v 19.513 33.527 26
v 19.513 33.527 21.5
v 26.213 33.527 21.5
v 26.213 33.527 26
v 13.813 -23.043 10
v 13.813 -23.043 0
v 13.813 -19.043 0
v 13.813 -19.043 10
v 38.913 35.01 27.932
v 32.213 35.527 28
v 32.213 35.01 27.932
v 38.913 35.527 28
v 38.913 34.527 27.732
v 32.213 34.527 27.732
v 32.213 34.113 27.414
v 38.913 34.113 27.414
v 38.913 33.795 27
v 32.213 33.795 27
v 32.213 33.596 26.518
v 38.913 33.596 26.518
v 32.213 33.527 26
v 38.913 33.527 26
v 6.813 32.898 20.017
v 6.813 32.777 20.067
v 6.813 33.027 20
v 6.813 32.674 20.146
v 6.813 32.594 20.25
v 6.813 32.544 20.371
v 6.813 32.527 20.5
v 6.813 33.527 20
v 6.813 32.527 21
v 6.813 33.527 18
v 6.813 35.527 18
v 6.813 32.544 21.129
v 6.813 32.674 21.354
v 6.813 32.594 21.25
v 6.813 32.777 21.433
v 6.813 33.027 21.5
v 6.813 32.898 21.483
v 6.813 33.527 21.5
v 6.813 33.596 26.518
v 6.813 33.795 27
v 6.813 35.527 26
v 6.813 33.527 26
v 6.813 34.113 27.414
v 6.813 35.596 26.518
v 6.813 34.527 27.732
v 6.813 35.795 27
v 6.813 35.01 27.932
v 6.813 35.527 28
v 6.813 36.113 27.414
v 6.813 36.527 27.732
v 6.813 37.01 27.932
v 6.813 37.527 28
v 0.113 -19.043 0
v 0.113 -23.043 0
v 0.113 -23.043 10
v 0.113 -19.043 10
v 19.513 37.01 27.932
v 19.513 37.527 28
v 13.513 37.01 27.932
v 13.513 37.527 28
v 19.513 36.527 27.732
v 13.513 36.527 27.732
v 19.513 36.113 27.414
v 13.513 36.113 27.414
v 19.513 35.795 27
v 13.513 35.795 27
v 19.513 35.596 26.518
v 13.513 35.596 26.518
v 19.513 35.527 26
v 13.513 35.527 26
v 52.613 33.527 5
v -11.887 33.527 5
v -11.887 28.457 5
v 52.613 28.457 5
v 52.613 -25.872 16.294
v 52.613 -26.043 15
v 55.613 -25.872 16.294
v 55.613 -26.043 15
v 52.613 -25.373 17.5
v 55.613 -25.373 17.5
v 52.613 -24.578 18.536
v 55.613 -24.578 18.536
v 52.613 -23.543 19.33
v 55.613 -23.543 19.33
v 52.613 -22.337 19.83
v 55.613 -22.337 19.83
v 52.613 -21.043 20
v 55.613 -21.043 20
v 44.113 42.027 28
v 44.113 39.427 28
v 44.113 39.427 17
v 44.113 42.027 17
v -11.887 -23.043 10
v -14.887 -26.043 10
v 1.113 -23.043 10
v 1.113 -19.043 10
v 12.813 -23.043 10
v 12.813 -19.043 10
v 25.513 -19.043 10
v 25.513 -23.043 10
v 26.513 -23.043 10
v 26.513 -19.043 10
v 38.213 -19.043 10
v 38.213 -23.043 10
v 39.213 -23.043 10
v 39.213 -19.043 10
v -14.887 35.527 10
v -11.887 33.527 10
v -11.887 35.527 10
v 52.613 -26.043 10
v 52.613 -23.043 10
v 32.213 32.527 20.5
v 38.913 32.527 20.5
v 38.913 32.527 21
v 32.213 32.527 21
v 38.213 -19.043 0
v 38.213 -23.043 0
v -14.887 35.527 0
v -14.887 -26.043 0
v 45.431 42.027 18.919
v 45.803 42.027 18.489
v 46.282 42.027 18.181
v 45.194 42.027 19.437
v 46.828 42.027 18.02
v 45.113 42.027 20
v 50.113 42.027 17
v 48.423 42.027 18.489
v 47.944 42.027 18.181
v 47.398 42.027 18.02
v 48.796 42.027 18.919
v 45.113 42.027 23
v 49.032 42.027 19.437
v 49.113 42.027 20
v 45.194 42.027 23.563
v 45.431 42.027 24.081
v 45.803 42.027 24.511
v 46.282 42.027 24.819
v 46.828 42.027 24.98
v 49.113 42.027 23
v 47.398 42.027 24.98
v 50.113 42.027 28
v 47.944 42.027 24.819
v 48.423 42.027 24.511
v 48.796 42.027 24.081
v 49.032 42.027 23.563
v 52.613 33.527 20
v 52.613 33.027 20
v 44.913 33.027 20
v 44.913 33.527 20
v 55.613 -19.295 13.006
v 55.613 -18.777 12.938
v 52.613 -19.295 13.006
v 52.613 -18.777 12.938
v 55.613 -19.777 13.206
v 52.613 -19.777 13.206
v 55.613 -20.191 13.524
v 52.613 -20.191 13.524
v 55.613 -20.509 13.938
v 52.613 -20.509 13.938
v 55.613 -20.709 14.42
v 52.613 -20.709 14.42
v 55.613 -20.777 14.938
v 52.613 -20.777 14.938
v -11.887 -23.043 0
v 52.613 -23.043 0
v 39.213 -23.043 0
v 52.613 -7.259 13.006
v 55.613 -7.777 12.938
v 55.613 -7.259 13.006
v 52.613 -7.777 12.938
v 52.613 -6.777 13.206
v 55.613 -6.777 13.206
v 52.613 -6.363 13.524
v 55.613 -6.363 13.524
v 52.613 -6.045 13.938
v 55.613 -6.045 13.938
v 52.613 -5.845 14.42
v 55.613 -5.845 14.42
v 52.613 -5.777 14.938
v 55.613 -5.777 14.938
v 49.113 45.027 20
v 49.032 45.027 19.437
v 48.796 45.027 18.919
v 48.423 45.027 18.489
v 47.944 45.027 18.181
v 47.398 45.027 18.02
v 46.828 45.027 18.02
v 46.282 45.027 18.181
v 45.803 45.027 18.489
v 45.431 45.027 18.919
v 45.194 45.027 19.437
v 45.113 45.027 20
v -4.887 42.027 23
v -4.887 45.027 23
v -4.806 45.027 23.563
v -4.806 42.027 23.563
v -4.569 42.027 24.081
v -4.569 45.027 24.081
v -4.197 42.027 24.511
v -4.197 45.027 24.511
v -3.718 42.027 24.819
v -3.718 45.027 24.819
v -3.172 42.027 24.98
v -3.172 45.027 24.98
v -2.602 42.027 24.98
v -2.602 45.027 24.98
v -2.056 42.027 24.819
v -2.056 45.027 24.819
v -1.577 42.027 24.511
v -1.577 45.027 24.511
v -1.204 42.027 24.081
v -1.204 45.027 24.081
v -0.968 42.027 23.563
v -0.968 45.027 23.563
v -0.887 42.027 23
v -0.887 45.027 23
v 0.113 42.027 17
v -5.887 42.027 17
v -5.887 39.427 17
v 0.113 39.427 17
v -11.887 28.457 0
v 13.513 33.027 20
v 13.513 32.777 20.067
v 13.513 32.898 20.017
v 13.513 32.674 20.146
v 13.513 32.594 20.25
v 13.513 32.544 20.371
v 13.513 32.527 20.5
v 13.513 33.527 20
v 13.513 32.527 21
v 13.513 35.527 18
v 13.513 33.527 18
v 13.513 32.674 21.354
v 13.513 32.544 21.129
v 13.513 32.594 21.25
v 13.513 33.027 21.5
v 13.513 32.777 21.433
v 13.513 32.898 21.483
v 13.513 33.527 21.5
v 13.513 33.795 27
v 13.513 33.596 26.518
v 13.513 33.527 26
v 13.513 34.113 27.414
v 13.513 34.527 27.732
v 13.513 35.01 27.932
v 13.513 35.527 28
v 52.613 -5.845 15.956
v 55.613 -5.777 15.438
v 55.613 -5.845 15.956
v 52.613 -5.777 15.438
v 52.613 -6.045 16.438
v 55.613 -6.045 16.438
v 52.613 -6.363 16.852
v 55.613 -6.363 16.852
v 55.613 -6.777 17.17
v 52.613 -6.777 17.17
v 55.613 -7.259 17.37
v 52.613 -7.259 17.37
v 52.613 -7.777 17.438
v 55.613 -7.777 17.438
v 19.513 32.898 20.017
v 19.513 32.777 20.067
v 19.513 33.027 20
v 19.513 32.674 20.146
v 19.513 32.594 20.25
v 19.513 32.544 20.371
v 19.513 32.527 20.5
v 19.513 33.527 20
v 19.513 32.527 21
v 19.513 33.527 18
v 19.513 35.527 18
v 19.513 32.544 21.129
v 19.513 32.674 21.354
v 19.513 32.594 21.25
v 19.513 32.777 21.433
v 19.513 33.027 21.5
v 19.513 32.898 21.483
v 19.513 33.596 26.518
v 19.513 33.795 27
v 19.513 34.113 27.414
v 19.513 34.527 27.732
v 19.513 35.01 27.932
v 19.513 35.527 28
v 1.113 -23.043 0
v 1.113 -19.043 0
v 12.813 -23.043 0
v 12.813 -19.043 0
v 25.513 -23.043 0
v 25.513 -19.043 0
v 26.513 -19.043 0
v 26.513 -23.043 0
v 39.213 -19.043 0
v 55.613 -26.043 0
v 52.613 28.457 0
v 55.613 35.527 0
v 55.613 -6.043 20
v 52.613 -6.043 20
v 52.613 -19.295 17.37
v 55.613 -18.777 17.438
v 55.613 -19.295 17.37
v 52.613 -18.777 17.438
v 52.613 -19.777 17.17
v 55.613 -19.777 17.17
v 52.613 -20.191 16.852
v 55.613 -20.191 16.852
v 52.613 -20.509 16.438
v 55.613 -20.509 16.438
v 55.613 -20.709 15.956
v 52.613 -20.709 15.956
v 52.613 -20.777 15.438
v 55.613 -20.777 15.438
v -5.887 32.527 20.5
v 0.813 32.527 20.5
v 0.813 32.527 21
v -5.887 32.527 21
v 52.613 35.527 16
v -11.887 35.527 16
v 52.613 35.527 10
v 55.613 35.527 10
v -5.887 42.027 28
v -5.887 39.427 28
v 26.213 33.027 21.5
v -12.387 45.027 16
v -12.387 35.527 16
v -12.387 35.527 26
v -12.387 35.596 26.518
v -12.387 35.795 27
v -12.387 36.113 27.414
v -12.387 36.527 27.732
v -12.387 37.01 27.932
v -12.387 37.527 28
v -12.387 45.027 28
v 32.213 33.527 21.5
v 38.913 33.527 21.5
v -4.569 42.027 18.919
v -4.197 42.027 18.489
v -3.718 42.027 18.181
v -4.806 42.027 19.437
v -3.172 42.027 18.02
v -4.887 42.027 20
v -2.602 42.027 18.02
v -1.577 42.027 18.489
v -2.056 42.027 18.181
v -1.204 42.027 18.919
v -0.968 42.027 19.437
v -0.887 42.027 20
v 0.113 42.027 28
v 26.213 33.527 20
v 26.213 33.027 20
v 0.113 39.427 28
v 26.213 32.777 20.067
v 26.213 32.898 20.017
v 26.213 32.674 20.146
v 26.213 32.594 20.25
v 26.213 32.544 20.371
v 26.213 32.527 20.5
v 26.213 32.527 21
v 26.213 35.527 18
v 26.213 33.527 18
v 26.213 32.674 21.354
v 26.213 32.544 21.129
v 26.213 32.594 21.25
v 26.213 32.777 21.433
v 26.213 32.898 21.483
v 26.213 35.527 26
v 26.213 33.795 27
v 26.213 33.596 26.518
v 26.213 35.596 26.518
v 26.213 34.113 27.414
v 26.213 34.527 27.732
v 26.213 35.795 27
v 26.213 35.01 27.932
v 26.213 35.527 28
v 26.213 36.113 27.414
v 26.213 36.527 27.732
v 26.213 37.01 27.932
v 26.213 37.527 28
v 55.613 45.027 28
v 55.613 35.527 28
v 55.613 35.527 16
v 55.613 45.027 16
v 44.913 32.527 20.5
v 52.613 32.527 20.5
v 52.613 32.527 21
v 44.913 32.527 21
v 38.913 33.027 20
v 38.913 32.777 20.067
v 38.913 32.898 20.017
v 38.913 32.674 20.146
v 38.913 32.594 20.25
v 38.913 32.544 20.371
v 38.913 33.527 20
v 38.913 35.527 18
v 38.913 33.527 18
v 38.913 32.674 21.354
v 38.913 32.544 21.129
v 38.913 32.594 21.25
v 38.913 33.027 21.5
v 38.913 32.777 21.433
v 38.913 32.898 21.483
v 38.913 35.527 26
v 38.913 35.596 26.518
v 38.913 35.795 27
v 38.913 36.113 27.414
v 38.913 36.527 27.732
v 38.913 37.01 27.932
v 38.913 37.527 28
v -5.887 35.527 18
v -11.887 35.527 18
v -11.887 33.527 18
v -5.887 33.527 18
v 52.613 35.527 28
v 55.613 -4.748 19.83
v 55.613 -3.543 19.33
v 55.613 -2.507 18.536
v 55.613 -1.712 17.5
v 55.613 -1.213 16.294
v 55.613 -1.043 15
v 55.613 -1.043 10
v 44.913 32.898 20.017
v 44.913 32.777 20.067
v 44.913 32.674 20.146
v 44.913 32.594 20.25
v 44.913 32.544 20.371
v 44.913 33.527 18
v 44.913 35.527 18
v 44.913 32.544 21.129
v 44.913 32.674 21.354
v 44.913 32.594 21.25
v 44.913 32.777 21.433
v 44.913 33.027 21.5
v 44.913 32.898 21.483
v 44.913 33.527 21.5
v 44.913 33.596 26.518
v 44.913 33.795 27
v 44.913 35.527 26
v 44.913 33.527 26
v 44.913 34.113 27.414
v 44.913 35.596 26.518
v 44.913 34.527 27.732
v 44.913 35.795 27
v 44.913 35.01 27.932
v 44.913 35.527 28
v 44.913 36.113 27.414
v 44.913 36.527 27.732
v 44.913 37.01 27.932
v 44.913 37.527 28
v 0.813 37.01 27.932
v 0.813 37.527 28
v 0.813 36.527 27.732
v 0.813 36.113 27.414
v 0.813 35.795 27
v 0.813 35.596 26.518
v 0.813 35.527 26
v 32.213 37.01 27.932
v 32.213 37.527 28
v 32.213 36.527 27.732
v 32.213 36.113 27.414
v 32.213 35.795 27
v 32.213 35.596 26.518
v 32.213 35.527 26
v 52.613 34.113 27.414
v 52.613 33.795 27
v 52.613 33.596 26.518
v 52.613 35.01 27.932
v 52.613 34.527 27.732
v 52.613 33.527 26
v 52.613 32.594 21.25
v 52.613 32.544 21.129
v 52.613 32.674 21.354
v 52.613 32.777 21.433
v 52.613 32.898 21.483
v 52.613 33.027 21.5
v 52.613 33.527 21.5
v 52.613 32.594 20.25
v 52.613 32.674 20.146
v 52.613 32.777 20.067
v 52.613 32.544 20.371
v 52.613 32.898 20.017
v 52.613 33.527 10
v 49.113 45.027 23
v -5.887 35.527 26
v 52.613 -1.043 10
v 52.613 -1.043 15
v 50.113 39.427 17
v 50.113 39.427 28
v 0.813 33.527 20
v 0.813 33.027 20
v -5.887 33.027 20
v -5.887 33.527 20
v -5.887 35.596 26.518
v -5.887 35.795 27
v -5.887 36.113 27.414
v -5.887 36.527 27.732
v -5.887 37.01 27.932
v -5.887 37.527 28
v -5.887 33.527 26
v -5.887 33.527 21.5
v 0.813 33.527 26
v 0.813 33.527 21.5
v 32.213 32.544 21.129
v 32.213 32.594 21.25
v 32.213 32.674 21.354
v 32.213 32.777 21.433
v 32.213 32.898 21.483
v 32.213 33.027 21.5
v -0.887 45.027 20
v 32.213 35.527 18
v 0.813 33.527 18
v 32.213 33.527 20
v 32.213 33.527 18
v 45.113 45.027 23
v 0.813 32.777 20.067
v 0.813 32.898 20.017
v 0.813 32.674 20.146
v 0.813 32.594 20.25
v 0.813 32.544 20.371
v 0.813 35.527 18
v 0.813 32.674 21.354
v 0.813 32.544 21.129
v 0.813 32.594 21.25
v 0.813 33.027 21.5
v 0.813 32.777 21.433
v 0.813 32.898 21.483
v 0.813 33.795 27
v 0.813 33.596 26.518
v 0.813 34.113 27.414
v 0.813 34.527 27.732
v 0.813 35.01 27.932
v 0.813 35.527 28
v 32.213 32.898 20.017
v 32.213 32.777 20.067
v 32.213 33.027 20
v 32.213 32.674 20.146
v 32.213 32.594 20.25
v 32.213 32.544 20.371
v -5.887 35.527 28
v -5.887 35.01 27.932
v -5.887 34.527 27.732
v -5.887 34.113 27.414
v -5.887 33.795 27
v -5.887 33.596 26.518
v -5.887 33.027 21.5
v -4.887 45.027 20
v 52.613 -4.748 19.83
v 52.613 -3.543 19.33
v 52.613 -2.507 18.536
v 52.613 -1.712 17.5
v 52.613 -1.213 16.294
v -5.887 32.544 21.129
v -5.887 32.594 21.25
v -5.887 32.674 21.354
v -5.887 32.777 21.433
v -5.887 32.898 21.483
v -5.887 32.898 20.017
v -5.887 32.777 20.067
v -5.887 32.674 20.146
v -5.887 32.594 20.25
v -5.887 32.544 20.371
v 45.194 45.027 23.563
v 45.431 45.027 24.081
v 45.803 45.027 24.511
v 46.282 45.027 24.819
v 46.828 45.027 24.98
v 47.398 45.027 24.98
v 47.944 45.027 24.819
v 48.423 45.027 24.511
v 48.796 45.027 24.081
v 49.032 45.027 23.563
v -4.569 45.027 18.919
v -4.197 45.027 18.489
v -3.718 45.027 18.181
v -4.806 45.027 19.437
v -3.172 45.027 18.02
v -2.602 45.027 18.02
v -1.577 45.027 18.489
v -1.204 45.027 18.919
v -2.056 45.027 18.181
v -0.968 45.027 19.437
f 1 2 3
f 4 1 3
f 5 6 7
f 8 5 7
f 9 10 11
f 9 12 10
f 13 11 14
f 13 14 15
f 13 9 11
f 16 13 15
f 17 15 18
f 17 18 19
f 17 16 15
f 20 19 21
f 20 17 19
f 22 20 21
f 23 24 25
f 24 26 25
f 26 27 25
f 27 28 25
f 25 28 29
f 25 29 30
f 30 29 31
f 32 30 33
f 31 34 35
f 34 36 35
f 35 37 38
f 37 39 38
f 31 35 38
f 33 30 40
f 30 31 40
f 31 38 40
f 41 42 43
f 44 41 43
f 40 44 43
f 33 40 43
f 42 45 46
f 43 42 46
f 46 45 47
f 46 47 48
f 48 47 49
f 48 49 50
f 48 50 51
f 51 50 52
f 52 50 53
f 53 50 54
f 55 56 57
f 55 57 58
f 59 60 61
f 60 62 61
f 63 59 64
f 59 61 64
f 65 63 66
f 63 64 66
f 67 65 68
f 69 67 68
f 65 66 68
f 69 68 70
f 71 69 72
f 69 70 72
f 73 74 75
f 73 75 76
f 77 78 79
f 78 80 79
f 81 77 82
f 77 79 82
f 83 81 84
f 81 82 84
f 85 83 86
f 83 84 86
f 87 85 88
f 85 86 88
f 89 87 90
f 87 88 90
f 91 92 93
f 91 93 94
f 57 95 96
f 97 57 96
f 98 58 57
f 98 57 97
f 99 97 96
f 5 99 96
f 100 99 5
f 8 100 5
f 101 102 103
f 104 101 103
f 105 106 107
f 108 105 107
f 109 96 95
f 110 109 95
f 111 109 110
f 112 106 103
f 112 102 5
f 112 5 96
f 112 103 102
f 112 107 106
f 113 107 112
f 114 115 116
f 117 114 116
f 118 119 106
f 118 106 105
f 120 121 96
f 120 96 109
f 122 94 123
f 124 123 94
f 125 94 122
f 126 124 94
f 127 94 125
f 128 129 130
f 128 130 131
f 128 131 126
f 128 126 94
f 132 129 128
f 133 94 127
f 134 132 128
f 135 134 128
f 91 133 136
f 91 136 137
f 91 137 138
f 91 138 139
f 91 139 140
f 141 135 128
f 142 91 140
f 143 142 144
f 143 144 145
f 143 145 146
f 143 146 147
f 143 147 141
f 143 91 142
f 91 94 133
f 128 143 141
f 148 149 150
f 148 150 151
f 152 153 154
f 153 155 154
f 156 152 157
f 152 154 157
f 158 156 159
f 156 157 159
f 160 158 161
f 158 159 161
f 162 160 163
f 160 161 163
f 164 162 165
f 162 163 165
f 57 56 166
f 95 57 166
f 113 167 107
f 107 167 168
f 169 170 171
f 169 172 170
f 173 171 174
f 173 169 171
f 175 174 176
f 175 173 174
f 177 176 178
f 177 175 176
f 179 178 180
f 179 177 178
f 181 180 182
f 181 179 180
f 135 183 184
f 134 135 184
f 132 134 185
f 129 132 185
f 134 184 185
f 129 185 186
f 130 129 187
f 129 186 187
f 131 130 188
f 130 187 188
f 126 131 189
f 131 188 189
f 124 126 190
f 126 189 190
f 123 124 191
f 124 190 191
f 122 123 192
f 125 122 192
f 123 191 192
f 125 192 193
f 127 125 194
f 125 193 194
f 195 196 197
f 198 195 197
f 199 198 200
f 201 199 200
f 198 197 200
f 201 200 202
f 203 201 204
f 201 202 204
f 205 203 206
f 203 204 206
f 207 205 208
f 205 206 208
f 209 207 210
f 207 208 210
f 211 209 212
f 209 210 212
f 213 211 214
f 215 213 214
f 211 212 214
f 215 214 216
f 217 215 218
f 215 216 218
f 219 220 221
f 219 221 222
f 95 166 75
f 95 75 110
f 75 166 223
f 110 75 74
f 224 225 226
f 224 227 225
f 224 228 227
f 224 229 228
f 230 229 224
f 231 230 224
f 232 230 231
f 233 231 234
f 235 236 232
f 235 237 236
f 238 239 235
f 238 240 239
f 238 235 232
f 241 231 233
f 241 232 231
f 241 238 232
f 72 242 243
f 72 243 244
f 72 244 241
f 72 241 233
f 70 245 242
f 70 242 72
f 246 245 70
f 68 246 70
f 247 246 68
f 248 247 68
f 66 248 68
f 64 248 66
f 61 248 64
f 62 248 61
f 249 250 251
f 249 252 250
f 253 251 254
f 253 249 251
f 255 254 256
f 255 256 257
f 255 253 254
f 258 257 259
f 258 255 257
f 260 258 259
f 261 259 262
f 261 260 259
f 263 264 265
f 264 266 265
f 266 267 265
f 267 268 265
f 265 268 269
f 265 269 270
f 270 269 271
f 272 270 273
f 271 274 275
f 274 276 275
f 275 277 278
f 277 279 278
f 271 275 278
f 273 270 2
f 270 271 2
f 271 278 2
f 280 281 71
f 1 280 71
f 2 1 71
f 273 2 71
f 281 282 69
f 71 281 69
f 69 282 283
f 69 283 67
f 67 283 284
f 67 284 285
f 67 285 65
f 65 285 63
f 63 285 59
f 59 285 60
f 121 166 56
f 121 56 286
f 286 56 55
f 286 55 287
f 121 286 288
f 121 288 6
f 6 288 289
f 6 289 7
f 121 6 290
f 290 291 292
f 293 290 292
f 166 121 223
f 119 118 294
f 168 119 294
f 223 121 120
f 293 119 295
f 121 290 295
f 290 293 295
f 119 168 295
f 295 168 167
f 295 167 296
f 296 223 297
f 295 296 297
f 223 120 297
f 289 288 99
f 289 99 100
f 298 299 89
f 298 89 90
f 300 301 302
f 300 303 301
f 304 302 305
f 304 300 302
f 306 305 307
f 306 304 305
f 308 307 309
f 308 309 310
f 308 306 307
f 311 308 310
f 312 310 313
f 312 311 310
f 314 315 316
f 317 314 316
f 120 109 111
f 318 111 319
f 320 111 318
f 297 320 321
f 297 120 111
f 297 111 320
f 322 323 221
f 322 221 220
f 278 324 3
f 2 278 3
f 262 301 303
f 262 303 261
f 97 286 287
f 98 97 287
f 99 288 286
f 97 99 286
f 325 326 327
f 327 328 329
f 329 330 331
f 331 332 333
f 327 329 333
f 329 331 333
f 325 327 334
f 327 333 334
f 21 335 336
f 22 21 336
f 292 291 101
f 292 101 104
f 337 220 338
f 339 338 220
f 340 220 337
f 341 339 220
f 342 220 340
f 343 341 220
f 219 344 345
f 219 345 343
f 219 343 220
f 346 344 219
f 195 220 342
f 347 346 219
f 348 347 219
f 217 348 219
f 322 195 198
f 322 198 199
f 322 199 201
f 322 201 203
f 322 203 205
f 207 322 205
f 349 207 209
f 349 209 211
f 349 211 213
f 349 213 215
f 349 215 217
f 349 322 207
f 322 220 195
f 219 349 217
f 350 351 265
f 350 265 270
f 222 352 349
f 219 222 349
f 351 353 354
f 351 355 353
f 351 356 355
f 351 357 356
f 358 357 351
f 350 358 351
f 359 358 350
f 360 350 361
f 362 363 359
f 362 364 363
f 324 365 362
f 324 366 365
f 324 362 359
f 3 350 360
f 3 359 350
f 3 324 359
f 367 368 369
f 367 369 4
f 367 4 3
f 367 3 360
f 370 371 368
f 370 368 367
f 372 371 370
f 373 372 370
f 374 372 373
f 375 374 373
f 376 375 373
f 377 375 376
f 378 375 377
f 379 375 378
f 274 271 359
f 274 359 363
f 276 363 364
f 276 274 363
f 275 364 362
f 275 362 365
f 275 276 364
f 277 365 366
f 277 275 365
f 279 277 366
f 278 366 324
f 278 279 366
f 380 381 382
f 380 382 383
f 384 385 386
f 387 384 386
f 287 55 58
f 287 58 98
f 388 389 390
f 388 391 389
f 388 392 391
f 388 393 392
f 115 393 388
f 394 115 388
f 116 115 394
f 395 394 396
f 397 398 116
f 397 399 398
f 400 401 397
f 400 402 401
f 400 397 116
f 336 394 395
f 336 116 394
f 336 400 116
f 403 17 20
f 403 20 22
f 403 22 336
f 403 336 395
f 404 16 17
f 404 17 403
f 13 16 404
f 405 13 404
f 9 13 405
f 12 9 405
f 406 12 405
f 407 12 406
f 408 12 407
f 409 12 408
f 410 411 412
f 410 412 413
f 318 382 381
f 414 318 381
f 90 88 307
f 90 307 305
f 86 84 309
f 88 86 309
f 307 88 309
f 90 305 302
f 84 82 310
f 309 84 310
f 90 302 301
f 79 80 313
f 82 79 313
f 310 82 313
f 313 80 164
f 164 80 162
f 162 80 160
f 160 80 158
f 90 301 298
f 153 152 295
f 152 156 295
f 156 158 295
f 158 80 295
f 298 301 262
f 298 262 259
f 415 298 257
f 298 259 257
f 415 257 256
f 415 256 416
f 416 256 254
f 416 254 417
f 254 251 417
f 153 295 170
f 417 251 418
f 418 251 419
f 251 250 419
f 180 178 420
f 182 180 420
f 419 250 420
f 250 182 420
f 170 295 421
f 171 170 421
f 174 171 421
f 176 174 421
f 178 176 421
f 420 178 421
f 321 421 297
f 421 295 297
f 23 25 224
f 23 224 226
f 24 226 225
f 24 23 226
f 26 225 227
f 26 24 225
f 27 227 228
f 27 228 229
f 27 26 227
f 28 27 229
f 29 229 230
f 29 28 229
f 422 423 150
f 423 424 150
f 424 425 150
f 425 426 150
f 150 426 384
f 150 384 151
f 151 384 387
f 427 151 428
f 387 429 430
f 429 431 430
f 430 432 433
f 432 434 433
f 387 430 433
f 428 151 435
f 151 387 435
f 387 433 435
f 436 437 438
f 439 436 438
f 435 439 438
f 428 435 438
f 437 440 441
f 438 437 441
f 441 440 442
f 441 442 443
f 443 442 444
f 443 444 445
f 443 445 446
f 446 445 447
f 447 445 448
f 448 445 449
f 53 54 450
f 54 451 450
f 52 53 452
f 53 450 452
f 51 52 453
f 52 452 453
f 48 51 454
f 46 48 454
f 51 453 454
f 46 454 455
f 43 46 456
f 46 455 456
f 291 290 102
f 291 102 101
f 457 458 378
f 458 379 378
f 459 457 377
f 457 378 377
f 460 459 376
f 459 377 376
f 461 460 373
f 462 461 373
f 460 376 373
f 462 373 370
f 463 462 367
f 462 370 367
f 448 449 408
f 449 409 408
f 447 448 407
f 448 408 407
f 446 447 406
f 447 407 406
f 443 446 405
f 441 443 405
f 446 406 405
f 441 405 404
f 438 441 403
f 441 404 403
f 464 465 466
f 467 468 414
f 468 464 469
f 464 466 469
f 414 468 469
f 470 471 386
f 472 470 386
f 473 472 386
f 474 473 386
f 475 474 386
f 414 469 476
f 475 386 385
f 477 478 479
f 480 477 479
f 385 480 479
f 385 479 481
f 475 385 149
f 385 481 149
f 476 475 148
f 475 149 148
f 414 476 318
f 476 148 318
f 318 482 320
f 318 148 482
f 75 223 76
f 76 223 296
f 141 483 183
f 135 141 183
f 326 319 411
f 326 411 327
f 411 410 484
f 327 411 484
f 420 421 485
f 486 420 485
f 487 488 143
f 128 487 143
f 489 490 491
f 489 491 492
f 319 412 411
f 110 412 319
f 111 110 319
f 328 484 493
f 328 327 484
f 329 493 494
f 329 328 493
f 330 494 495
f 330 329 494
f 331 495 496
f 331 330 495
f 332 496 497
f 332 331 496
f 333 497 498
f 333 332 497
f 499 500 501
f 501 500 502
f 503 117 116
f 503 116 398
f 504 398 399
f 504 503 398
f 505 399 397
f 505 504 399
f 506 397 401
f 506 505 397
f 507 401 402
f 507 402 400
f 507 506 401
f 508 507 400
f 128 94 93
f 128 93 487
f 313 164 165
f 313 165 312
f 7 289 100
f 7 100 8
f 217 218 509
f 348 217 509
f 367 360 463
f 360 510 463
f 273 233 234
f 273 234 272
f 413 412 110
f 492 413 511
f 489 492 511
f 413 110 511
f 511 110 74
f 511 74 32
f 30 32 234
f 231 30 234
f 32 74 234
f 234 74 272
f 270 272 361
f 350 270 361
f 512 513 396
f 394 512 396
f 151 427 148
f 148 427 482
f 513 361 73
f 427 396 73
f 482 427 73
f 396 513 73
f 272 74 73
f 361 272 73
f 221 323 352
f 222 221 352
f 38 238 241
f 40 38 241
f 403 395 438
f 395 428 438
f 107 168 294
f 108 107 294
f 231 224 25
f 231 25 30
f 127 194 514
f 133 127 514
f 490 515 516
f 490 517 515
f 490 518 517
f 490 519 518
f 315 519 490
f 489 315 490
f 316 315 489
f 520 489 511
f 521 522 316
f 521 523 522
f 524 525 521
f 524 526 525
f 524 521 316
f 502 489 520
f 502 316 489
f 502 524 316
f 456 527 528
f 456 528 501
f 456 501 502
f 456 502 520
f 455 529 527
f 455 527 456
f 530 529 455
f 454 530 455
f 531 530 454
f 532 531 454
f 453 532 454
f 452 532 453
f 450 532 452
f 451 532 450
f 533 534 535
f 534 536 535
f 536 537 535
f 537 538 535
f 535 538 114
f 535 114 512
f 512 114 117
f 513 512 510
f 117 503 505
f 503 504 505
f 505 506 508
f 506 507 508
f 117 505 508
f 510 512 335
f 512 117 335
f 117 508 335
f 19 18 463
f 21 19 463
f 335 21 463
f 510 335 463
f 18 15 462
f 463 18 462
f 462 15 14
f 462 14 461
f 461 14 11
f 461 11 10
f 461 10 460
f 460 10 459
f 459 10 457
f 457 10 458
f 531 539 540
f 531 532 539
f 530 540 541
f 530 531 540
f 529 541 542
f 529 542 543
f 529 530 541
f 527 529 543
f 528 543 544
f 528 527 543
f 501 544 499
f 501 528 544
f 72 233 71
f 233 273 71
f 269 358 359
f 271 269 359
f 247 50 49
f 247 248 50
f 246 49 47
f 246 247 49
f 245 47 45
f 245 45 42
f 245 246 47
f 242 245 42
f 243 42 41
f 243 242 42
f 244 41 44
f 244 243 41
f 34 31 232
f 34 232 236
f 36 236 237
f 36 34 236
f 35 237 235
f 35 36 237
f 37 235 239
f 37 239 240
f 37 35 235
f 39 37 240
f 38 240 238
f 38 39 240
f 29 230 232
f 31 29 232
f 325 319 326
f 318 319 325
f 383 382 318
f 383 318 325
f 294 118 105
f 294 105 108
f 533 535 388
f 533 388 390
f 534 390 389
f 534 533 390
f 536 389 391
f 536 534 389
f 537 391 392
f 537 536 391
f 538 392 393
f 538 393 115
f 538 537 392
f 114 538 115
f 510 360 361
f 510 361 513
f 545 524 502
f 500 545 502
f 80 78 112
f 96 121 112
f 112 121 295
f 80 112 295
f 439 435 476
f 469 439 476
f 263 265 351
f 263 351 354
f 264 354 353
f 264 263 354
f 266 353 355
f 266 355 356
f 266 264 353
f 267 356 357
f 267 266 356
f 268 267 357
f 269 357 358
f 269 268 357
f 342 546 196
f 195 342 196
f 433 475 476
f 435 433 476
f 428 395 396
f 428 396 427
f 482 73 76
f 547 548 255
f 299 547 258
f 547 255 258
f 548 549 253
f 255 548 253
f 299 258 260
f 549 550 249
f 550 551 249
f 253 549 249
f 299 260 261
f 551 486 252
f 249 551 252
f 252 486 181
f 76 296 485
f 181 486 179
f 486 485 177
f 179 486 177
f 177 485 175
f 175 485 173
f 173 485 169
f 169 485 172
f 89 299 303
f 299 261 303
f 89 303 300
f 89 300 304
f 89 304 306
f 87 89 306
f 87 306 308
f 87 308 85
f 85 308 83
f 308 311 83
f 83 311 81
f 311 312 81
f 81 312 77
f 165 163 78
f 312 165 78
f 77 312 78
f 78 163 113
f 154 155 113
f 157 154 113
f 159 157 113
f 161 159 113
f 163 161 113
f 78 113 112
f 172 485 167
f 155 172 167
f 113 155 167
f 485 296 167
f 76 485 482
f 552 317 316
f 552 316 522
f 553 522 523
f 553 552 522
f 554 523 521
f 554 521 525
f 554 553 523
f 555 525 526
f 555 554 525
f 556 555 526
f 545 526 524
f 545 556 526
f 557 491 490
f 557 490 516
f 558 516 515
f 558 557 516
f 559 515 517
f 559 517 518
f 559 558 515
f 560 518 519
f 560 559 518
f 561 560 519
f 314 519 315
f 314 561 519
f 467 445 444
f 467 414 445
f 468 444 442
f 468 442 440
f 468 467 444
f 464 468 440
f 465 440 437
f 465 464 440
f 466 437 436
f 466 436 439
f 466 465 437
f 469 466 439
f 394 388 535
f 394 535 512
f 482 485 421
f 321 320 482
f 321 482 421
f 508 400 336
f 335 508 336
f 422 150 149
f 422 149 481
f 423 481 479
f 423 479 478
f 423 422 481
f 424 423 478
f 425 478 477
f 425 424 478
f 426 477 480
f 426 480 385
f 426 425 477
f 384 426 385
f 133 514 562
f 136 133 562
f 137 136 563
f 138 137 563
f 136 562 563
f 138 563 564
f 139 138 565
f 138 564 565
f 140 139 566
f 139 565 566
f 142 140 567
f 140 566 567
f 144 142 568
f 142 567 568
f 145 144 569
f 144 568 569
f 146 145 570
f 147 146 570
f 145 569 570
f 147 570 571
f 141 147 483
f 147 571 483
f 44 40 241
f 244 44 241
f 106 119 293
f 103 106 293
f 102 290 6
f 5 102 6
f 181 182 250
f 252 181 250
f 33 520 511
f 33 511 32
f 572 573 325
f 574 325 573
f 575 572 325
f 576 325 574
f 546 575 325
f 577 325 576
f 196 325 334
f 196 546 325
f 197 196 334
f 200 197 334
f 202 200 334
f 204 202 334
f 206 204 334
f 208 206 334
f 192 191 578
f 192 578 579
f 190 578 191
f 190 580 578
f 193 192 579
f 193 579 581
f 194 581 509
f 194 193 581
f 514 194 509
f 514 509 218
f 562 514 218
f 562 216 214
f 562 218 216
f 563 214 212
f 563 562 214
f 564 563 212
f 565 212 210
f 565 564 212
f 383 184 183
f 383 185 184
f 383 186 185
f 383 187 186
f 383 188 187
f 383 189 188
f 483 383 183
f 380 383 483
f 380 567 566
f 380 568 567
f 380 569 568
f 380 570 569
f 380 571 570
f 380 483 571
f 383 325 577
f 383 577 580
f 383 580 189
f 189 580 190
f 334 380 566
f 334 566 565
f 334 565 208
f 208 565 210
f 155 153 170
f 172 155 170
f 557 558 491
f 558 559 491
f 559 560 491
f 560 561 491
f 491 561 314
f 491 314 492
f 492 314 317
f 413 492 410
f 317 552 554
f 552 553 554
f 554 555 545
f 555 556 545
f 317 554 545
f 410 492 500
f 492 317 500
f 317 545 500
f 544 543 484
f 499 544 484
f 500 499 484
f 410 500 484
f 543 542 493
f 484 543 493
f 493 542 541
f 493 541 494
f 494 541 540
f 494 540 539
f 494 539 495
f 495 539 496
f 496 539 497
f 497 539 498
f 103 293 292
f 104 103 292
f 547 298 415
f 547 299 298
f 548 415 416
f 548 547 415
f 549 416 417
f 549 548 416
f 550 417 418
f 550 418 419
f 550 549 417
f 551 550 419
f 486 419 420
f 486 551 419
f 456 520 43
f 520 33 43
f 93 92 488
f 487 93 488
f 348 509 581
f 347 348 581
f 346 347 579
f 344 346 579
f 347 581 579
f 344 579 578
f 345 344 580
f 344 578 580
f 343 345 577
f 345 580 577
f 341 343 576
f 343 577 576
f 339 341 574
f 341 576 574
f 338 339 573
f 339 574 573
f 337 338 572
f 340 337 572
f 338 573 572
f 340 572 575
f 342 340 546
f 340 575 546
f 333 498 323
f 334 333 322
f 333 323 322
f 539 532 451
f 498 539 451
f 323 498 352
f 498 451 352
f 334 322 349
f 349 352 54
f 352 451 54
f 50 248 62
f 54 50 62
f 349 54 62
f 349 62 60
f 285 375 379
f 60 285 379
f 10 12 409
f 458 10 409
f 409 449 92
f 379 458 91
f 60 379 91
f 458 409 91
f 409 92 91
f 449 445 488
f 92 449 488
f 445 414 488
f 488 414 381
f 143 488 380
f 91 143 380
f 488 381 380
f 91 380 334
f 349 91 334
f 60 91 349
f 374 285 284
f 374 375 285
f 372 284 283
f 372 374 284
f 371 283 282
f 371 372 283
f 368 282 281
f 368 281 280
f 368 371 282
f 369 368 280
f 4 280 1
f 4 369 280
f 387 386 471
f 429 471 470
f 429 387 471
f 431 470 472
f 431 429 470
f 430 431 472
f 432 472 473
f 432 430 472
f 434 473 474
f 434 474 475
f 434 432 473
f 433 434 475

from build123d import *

# Parameters (mm, degrees)
F0_W      = 70.5
F0_H      = 61.57
F0_W_2    = 1
F0_H_2    = 4
F1_DEPTH  = 10
F0_W_3    = 64.5
F0_H_3    = 5.07
F2_DEPTH  = 5
F3_W      = 64.5
F3_H      = 2
F4_DEPTH  = 18
F5_W      = 1
F5_H      = 1.5
F6_DEPTH  = 64.5
F7_R      = 0.5
F8_W      = 6
F8_H      = 9.142870052
F9_DEPTH  = 10
F10_W     = 9.5
F10_H     = 12
F11_DEPTH = 68
F13_DEPTH = 4
F14_W     = 6
F14_H     = 2.6
F15_DEPTH = 11
F17_DEPTH = 10
F18_W     = 15
F18_H     = 4.5
F19_DEPTH = 25
F20_R     = 5
F21_R     = 1.99999


# Not quite as in the source:
# - a fillet or chamfer is up to 0.001 mm smaller than in the source, because OpenCascade refuses the exact size


with BuildPart() as f1:
    # F0 (on Top) → F1 (new body)
    with BuildSketch(Plane.XY):
        with Locations((20.3630310733, 4.7424566842)):
            Rectangle(F0_W, F0_H)
        Polygon((-11.8869689267, 28.4574566842), (-11.8869689267, 33.5274566842), (52.6130310733, 33.5274566842), (52.6130310733, 28.4574566842), (52.6130310733, -23.0425433158), (39.2130310733, -23.0425433158), (38.2130310733, -23.0425433158), (26.5130310733, -23.0425433158), (25.5130310733, -23.0425433158), (13.8130310733, -23.0425433158), (12.8130310733, -23.0425433158), (1.1130310733, -23.0425433158), (0.1130310733, -23.0425433158), (-11.8869689267, -23.0425433158), align=None, mode=Mode.SUBTRACT)
        with Locations((0.6130310733, -21.0425433158)):
            Rectangle(F0_W_2, F0_H_2)
        with Locations((13.3130310733, -21.0425433158)):
            Rectangle(F0_W_2, F0_H_2)
        with Locations((26.0130310733, -21.0425433158)):
            Rectangle(F0_W_2, F0_H_2)
        with Locations((38.7130310733, -21.0425433158)):
            Rectangle(F0_W_2, F0_H_2)
    extrude(amount=F1_DEPTH)

    # F0 (on Top) → F2 (join)
    with BuildSketch(Plane.XY):
        with Locations((20.3630310733, 30.9924566842)):
            Rectangle(F0_W_3, F0_H_3)
    extrude(amount=F2_DEPTH)

    # F3 (on face) → F4 (join)
    with BuildSketch(Plane.XY.offset(10)):
        with Locations((20.3630310733, 34.5274566842)):
            Rectangle(F3_W, F3_H)
    extrude(amount=F4_DEPTH)

    # F5 (on face) → F6 (join)
    with BuildSketch(Plane.YZ.offset(52.6130310733)):
        with Locations((33.0274566842, 20.75)):
            Rectangle(F5_W, F5_H)
    extrude(amount=-F6_DEPTH)

    # F7
    f7_edges = [f1.edges().sort_by_distance(p)[0] for p in [
        (20.363031, 32.527457, 21.5),
        (20.363031, 32.527457, 20),
    ]]
    fillet(f7_edges, radius=F7_R)

    # F8 (on face) → F9 (cut)
    with BuildSketch(Plane.XY.offset(28)):
        with Locations((-8.8869689267, 30.9560216582)):
            Rectangle(F8_W, F8_H)
        with Locations((3.8130310733, 30.9560216582)):
            Rectangle(F8_W, F8_H)
        with Locations((16.5130310733, 30.9560216582)):
            Rectangle(F8_W, F8_H)
        with Locations((29.2130310733, 30.9560216582)):
            Rectangle(F8_W, F8_H)
        with Locations((41.9130310733, 30.9560216582)):
            Rectangle(F8_W, F8_H)
    extrude(amount=-F9_DEPTH, mode=Mode.SUBTRACT)

    # F10 (on face) → F11 (join)
    with BuildSketch(Plane.YZ.offset(55.6130310733)):
        with Locations((40.2774566842, 22)):
            Rectangle(F10_W, F10_H)
    extrude(amount=-F11_DEPTH)

    # F12 (on face) → F13 (cut)
    with BuildSketch(Plane(origin=(0, 45.0274566842, 0), x_dir=(-1, 0, 0), z_dir=(0, 1, 0))):
        with BuildLine():
            ThreePointArc((-48.4359067289, 21.5), (-48.9359067289, 20.8228756555), (-49.1130310733, 20))
            ThreePointArc((-49.1130310733, 20), (-47.1130310733, 18), (-45.1130310733, 20))
            ThreePointArc((-45.1130310733, 20), (-45.2901554178, 20.8228756555), (-45.7901554178, 21.5))
            ThreePointArc((-45.7901554178, 21.5), (-47.1130310733, 21), (-48.4359067289, 21.5))
        make_face()
        with BuildLine():
            Line((-49.1130310733, 23), (-49.1130310733, 20))
            ThreePointArc((-49.1130310733, 20), (-48.9359067289, 20.8228756555), (-48.4359067289, 21.5))
            ThreePointArc((-48.4359067289, 21.5), (-48.9359067289, 22.1771243445), (-49.1130310733, 23))
        make_face()
        with BuildLine():
            ThreePointArc((-45.7901554178, 21.5), (-45.2901554178, 20.8228756555), (-45.1130310733, 20))
            Line((-45.1130310733, 20), (-45.1130310733, 23))
            ThreePointArc((-45.1130310733, 23), (-45.2901554178, 22.1771243445), (-45.7901554178, 21.5))
        make_face()
        with BuildLine():
            ThreePointArc((-49.1130310733, 23), (-48.9359067289, 22.1771243445), (-48.4359067289, 21.5))
            ThreePointArc((-48.4359067289, 21.5), (-47.1130310733, 22), (-45.7901554178, 21.5))
            ThreePointArc((-45.7901554178, 21.5), (-45.2901554178, 22.1771243445), (-45.1130310733, 23))
            ThreePointArc((-45.1130310733, 23), (-47.1130310733, 25), (-49.1130310733, 23))
        make_face()
        with BuildLine():
            ThreePointArc((1.5640932711, 21.5), (1.0640932711, 20.8228756555), (0.8869689267, 20))
            ThreePointArc((0.8869689267, 20), (2.8869689267, 18), (4.8869689267, 20))
            ThreePointArc((4.8869689267, 20), (4.7098445822, 20.8228756555), (4.2098445822, 21.5))
            ThreePointArc((4.2098445822, 21.5), (2.8869689267, 21), (1.5640932711, 21.5))
        make_face()
        with BuildLine():
            Line((0.8869689267, 23), (0.8869689267, 20))
            ThreePointArc((0.8869689267, 20), (1.0640932711, 20.8228756555), (1.5640932711, 21.5))
            ThreePointArc((1.5640932711, 21.5), (1.0640932711, 22.1771243445), (0.8869689267, 23))
        make_face()
        with BuildLine():
            ThreePointArc((4.2098445822, 21.5), (4.7098445822, 20.8228756555), (4.8869689267, 20))
            Line((4.8869689267, 20), (4.8869689267, 23))
            ThreePointArc((4.8869689267, 23), (4.7098445822, 22.1771243445), (4.2098445822, 21.5))
        make_face()
        with BuildLine():
            ThreePointArc((0.8869689267, 23), (1.0640932711, 22.1771243445), (1.5640932711, 21.5))
            ThreePointArc((1.5640932711, 21.5), (2.8869689267, 22), (4.2098445822, 21.5))
            ThreePointArc((4.2098445822, 21.5), (4.7098445822, 22.1771243445), (4.8869689267, 23))
            ThreePointArc((4.8869689267, 23), (2.8869689267, 25), (0.8869689267, 23))
        make_face()
        with BuildLine():
            ThreePointArc((-45.7901554178, 21.5), (-47.1130310733, 22), (-48.4359067289, 21.5))
            ThreePointArc((-48.4359067289, 21.5), (-47.1130310733, 21), (-45.7901554178, 21.5))
        make_face()
        with BuildLine():
            ThreePointArc((4.2098445822, 21.5), (2.8869689267, 22), (1.5640932711, 21.5))
            ThreePointArc((1.5640932711, 21.5), (2.8869689267, 21), (4.2098445822, 21.5))
        make_face()
    extrude(amount=-F13_DEPTH, mode=Mode.SUBTRACT)

    # F14 (on face) → F15 (cut)
    with BuildSketch(Plane.XY.offset(28)):
        with Locations((-2.8869689267, 40.7274566842)):
            Rectangle(F14_W, F14_H)
        with Locations((47.1130310733, 40.7274566842)):
            Rectangle(F14_W, F14_H)
    extrude(amount=-F15_DEPTH, mode=Mode.SUBTRACT)

    # F16 (on face) → F17 (join)
    with BuildSketch(Plane.XY.offset(10)):
        Polygon((52.6130310733, -26.0425433158), (55.6130310733, -26.0425433158), (55.6130310733, -1.0425433158), (52.6130310733, -1.0425433158), (52.6130310733, -23.0425433158), align=None)
    extrude(amount=F17_DEPTH)

    # F18 (on face) → F19 (cut)
    with BuildSketch(Plane.YZ.offset(55.6130310733)):
        with Locations((-13.2769846171, 15.1880288571)):
            Rectangle(F18_W, F18_H)
    extrude(amount=-F19_DEPTH, mode=Mode.SUBTRACT)

    # F20
    f20_edges = [f1.edges().sort_by_distance(p)[0] for p in [
        (54.113031, -1.042543, 20),
        (54.113031, -26.042543, 20),
    ]]
    fillet(f20_edges, radius=F20_R)

    # F21 (radius 2 in the source; OpenCascade refuses exactly that, so slightly less here)
    f21_edges = [f1.edges().sort_by_distance(p)[0] for p in [
        (54.113031, -20.776985, 17.438029),
        (54.113031, -20.776985, 12.938029),
        (54.113031, -5.776985, 12.938029),
        (54.113031, -5.776985, 17.438029),
        (41.913031, 35.527457, 28),
        (48.763031, 33.527457, 28),
        (35.563031, 33.527457, 28),
        (29.213031, 35.527457, 28),
        (22.863031, 33.527457, 28),
        (16.513031, 35.527457, 28),
        (10.163031, 33.527457, 28),
        (3.813031, 35.527457, 28),
        (-2.536969, 33.527457, 28),
        (-9.136969, 35.527457, 28),
    ]]
    fillet(f21_edges, radius=F21_R)


solid = f1.part
